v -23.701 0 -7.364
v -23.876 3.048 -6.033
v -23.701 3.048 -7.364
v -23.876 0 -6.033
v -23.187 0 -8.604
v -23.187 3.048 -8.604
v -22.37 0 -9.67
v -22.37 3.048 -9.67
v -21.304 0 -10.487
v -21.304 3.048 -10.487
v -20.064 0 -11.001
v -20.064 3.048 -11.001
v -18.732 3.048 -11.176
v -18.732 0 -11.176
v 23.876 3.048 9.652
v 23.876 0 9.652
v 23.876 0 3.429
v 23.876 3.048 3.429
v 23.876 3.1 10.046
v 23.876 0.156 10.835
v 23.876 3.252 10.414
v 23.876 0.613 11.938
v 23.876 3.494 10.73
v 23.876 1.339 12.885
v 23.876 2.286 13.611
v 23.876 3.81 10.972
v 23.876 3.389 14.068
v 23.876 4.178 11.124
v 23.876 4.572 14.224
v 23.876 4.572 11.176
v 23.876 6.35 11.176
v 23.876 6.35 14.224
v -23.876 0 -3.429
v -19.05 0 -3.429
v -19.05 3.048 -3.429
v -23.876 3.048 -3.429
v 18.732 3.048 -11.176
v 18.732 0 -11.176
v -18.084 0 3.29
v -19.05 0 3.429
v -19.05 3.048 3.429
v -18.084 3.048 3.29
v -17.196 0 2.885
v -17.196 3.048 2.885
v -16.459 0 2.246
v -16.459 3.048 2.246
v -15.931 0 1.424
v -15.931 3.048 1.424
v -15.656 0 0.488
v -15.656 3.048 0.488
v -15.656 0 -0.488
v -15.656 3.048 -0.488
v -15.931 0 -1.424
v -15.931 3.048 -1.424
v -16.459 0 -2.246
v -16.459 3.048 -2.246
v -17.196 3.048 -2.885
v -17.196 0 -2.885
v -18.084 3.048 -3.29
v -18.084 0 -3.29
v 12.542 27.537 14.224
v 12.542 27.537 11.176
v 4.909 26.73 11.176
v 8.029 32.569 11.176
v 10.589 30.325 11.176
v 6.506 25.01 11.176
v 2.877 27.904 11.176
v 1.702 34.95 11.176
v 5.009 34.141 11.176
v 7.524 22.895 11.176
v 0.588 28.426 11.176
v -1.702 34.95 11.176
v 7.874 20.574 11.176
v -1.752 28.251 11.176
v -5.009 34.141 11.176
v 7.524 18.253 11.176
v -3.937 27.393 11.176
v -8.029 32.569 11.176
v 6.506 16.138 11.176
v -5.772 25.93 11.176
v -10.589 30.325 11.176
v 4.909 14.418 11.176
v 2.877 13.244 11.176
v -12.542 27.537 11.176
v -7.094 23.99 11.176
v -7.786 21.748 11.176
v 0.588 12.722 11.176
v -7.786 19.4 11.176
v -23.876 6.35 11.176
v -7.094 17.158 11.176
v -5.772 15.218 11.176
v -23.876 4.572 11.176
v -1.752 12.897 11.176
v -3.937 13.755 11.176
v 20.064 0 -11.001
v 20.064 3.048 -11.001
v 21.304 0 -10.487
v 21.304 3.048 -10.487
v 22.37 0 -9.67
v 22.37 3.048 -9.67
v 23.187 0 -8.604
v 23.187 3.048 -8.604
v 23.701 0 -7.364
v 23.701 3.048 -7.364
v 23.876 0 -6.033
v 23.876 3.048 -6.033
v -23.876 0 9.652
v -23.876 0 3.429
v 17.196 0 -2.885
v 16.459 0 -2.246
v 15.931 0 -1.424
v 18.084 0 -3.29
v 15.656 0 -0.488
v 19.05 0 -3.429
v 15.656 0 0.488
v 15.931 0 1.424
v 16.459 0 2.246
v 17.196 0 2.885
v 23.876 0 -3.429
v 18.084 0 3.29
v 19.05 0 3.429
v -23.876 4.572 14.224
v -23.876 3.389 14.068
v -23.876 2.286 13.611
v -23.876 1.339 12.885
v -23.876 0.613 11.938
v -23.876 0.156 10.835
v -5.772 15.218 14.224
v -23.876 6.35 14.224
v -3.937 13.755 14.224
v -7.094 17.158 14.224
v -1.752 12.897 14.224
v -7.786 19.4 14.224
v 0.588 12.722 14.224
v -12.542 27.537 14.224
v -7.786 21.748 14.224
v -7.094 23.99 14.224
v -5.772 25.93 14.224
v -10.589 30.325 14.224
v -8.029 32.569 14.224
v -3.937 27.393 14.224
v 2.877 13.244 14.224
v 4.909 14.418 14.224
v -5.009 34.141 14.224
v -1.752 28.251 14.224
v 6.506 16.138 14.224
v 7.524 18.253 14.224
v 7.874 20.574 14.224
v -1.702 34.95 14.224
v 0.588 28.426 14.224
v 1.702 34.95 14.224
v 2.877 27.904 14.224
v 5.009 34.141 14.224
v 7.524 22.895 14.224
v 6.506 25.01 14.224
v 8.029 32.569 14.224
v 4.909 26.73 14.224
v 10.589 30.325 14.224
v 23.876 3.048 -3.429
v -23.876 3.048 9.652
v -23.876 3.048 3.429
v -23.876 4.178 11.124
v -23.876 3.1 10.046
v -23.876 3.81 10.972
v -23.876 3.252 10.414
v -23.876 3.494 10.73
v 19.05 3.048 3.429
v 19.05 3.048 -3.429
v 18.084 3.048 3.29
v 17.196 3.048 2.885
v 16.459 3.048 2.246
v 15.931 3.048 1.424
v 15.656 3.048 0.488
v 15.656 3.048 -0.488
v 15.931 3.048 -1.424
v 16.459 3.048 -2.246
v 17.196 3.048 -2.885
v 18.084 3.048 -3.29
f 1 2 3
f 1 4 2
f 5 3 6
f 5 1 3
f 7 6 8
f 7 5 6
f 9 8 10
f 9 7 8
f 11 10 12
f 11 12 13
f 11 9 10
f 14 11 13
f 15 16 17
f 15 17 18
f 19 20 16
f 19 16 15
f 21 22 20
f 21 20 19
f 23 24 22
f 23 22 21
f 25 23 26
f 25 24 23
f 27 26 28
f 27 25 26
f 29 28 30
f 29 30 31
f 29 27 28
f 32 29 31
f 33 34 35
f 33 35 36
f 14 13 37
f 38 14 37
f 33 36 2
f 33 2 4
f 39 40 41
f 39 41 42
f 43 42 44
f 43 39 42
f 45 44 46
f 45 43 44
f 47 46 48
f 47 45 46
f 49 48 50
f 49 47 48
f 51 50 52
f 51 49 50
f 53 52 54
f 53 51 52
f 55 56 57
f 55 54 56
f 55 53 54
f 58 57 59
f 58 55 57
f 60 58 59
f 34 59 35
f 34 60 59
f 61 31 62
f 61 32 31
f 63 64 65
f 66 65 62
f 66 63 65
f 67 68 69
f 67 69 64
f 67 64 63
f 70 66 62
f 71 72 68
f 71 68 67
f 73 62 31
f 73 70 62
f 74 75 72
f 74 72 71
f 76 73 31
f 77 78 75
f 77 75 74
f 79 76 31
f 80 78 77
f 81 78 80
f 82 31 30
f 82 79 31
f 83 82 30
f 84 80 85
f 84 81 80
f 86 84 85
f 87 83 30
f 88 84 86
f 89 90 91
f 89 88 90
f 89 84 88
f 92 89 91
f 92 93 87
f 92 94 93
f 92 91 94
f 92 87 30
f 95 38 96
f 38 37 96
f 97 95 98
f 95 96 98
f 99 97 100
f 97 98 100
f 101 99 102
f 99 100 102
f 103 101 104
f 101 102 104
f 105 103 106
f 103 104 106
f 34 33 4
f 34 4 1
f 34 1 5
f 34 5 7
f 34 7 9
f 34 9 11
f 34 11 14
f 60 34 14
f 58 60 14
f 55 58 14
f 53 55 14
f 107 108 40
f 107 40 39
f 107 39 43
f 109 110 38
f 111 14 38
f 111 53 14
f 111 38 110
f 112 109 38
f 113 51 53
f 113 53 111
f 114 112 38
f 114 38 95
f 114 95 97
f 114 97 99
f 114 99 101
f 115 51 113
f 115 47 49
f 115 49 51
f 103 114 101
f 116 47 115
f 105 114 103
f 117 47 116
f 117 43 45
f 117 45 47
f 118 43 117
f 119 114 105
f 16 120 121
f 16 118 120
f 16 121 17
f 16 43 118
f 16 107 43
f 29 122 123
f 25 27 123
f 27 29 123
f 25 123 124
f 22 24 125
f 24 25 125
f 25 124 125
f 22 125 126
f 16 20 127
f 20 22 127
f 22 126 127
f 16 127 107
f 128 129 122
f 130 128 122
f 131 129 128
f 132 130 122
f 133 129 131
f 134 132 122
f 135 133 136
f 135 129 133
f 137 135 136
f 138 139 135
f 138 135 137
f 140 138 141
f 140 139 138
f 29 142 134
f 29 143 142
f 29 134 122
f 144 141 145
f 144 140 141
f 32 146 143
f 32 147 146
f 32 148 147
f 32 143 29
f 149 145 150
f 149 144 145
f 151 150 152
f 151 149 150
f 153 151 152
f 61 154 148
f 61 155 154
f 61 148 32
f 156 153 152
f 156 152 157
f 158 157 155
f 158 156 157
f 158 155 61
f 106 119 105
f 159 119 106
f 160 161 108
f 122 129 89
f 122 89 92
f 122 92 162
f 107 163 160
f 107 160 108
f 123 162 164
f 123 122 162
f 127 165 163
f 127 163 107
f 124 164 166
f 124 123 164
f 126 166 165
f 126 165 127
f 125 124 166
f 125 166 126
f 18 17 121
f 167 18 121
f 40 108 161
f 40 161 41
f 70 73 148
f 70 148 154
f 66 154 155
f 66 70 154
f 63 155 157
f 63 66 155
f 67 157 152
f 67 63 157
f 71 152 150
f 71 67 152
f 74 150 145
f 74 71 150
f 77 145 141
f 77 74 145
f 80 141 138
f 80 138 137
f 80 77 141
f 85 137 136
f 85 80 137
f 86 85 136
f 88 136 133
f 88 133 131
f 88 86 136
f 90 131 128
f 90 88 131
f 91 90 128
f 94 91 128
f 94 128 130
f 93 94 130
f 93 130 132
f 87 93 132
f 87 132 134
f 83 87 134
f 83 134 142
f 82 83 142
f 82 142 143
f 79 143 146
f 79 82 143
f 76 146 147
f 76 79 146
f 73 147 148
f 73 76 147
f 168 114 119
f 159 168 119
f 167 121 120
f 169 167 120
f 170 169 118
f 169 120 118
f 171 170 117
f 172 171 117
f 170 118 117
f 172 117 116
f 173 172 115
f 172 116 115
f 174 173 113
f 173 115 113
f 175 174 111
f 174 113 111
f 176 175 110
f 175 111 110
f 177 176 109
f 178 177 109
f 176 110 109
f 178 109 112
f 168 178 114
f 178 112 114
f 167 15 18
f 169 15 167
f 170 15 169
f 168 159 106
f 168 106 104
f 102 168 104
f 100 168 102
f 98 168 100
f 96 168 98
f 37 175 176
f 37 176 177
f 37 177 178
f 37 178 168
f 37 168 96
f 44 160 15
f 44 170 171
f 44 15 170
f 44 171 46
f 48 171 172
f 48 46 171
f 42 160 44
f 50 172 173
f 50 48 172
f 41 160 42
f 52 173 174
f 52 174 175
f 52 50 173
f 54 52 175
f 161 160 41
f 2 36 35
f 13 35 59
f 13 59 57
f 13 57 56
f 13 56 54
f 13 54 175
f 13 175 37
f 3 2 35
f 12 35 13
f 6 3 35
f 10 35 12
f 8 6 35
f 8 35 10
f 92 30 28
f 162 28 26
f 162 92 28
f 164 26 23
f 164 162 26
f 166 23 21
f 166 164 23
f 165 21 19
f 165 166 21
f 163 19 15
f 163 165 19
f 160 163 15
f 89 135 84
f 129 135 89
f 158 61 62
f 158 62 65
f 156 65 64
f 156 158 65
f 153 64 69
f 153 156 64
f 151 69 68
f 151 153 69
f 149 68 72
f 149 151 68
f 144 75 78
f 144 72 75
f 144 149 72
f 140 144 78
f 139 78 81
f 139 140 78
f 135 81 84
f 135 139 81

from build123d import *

# Parameters (mm, degrees)
SKETCH3_R                = 7.874
BOSS_EXTRUDE1_DEPTH      = 14.224
BOSS_EXTRUDE1_DEPTH_BACK = 11.176
CUT_EXTRUDE1_DEPTH       = 36.052
CUT_EXTRUDE2_DEPTH       = 48.752
FILLET1_R                = 5.1435


with BuildPart() as part:
    # Sketch3 → Boss-Extrude1 (new body, two sides)
    with BuildSketch(Plane.XY) as boss_extrude1_sk:
        with BuildLine():
            Line((-23.876, 0), (23.876, 0))
            Line((23.876, 0), (23.876, 6.35))
            Line((23.876, 6.35), (12.542250985, 27.537256011))
            ThreePointArc((12.542250985, 27.537256011), (0, 35.052), (-12.542250985, 27.537256011))
            Line((-12.542250985, 27.537256011), (-23.876, 6.35))
            Line((-23.876, 6.35), (-23.876, 0))
        make_face()
        with Locations((0, 20.574)):
            Circle(SKETCH3_R, mode=Mode.SUBTRACT)
    extrude(amount=BOSS_EXTRUDE1_DEPTH)
    extrude(boss_extrude1_sk.sketch, amount=-BOSS_EXTRUDE1_DEPTH_BACK)

    # Sketch4 → Cut-Extrude1 (cut, through all)
    with BuildSketch(Plane(origin=(0, 0, 0), x_dir=(1, 0, 0), z_dir=(0, 1, 0))):
        with BuildLine():
            Line((-23.876, 3.429), (-23.876, -3.429))
            Line((-23.876, -3.429), (-19.05, -3.429))
            ThreePointArc((-19.05, -3.429), (-15.621, 0), (-19.05, 3.429))
            Line((-19.05, 3.429), (-23.876, 3.429))
        make_face()
        with BuildLine():
            Line((19.05, 3.429), (23.876, 3.429))
            Line((23.876, 3.429), (23.876, -3.429))
            Line((23.876, -3.429), (19.05, -3.429))
            ThreePointArc((19.05, -3.429), (15.621, 0), (19.05, 3.429))
        make_face()
    extrude(amount=CUT_EXTRUDE1_DEPTH, mode=Mode.SUBTRACT)

    # Sketch5 → Cut-Extrude2 (cut, through all)
    with BuildSketch(Plane.ZY.offset(23.876)):
        with BuildLine():
            Line((-11.176, 35.052), (11.176, 35.052))
            Line((11.176, 35.052), (11.176, 4.572))
            ThreePointArc((11.176, 4.572), (10.729630735, 3.494369265), (9.652, 3.048))
            Line((9.652, 3.048), (-11.176, 3.048))
            Line((-11.176, 3.048), (-11.176, 35.052))
        make_face()
        with BuildLine():
            Line((9.652, 0), (14.224, 0))
            Line((14.224, 0), (14.224, 4.572))
            ThreePointArc((14.224, 4.572), (12.884892204, 1.339107796), (9.652, 0))
        make_face()
    extrude(amount=-CUT_EXTRUDE2_DEPTH, mode=Mode.SUBTRACT)

    # Fillet1
    fillet1_edges = [part.edges().sort_by_distance(p)[0] for p in [
        (23.876, 1.524, -11.176),
        (-23.876, 1.524, -11.176),
    ]]
    fillet(fillet1_edges, radius=FILLET1_R)


solid = part.part
